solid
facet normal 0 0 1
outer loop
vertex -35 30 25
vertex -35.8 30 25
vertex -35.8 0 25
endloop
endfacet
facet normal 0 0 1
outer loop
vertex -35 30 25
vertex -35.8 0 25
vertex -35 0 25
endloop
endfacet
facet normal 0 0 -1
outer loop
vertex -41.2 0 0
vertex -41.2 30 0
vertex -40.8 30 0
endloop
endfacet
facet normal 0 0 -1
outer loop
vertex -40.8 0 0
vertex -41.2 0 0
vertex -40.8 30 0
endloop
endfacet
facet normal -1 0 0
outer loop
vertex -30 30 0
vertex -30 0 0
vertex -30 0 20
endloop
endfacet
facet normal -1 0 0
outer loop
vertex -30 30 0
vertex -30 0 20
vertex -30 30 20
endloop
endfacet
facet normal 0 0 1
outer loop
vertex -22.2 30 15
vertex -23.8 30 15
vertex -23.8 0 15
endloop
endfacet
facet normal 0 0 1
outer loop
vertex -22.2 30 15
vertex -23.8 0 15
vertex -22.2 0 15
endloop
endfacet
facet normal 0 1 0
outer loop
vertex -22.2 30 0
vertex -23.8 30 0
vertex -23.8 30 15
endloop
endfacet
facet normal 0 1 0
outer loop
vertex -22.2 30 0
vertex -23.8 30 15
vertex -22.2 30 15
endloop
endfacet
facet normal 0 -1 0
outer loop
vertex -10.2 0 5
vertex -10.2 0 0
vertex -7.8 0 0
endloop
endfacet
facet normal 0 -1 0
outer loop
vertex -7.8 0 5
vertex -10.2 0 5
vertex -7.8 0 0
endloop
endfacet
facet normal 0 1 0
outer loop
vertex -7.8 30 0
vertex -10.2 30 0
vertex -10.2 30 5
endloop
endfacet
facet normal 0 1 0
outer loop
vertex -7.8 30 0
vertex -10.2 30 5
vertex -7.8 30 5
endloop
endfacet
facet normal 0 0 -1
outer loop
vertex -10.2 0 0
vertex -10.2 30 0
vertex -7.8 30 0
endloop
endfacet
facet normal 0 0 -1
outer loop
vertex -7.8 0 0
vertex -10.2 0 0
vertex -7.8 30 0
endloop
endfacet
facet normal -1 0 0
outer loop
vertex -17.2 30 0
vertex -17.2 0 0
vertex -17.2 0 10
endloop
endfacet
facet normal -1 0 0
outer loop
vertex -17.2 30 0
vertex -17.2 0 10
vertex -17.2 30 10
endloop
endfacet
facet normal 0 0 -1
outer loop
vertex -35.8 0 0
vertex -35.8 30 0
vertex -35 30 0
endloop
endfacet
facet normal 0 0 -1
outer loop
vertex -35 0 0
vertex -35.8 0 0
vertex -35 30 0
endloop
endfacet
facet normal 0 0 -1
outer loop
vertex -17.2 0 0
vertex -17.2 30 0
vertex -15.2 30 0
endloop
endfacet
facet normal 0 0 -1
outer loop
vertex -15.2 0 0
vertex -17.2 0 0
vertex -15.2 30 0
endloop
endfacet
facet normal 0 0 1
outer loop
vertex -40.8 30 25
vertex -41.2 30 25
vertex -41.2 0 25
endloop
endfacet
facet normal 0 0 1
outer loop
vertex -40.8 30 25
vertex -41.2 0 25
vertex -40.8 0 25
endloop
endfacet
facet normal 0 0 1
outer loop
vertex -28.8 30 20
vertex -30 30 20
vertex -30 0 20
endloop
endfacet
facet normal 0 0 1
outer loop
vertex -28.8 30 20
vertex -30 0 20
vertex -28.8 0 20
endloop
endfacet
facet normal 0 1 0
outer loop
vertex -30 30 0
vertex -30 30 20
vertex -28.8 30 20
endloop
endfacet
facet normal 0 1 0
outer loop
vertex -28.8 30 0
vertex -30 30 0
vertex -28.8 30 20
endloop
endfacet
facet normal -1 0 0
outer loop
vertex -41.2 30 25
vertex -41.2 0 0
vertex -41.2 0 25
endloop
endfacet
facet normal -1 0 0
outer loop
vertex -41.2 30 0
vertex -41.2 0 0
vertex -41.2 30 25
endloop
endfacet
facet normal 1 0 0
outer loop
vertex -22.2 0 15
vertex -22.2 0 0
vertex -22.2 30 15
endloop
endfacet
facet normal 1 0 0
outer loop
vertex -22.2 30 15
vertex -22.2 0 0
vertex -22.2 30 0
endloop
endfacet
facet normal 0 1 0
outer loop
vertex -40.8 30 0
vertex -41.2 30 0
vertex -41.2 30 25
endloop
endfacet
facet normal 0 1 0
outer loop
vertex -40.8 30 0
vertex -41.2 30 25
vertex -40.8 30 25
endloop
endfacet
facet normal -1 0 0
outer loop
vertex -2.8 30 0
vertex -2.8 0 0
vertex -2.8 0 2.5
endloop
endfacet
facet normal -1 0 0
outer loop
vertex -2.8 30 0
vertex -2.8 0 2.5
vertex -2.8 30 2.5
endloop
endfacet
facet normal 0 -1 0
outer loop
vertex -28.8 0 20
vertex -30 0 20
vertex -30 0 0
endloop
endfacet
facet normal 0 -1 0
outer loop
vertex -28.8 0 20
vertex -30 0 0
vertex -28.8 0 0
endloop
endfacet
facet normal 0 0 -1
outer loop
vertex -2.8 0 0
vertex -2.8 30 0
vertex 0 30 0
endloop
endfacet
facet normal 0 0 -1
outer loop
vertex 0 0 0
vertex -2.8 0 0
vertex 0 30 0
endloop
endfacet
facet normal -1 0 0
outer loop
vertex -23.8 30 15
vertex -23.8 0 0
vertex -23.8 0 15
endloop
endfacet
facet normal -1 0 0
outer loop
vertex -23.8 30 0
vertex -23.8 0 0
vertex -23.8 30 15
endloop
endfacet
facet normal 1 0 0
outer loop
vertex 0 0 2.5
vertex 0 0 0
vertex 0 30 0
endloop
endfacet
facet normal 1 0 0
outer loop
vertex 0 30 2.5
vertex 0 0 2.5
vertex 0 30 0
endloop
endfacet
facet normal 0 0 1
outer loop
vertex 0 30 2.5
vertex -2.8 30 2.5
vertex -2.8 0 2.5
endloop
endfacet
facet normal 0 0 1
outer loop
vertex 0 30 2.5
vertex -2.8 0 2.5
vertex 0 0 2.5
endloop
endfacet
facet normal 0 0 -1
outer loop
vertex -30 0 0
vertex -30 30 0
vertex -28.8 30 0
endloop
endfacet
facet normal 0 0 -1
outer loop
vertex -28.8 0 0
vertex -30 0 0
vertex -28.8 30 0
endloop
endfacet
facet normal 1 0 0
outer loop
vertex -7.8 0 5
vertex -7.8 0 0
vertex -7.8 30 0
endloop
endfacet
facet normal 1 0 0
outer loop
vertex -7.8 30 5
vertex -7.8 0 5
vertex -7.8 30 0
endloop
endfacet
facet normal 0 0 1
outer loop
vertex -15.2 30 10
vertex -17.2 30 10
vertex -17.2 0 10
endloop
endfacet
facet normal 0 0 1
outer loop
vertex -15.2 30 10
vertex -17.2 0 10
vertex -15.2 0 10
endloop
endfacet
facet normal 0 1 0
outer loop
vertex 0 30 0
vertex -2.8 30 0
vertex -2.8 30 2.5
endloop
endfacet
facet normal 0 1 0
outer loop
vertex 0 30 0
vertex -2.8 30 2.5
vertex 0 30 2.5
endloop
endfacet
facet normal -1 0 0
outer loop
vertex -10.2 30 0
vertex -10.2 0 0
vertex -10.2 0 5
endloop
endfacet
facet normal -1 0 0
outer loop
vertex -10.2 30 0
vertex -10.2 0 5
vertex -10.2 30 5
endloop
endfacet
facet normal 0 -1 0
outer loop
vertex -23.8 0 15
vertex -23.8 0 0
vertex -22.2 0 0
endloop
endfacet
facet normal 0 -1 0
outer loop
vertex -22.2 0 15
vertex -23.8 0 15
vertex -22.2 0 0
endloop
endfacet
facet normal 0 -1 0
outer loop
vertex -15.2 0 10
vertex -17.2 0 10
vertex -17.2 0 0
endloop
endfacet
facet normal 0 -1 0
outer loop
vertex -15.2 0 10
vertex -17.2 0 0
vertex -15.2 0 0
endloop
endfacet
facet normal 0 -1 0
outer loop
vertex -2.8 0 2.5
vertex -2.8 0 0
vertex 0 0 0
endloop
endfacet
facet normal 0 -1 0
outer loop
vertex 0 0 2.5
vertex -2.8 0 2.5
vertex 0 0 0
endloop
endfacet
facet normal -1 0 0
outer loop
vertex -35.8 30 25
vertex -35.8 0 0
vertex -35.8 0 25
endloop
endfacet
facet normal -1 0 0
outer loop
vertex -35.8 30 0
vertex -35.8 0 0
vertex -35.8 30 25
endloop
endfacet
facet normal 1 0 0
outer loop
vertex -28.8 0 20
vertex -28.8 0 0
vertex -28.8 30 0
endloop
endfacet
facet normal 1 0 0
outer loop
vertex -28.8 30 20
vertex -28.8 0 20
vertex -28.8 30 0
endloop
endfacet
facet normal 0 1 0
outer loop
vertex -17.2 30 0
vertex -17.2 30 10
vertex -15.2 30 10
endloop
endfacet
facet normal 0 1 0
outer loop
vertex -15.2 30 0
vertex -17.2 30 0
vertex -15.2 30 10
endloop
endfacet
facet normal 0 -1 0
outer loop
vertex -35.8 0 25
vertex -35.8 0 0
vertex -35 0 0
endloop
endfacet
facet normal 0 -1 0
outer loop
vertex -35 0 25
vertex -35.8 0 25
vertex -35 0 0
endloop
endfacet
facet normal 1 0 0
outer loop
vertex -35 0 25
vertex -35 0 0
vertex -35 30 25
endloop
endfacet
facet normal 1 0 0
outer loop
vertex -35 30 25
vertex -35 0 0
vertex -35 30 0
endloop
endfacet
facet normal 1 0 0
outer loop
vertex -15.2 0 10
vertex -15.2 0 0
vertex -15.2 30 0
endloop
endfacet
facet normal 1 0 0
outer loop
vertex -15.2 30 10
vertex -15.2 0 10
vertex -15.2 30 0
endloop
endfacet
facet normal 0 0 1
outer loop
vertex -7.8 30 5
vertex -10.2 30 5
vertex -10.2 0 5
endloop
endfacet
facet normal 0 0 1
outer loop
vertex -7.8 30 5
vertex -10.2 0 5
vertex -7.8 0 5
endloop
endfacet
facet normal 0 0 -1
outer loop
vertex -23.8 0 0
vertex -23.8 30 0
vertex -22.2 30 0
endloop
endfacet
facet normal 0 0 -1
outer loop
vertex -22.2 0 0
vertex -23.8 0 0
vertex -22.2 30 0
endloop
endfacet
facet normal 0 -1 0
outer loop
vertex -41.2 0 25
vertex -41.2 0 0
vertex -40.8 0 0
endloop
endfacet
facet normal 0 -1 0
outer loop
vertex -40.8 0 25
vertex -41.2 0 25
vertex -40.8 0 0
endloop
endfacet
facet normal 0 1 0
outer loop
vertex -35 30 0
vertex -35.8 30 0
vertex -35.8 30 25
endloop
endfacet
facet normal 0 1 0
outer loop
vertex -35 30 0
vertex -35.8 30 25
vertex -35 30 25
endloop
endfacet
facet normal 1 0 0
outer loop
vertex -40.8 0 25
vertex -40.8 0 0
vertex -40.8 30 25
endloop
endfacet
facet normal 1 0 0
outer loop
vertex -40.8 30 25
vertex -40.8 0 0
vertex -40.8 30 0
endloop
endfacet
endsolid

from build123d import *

# Parameters (mm, degrees)
F0_W     = 0.4
F0_H     = 30
F1_DEPTH = 25
F0_W_2   = 0.8
F2_DEPTH = 25
F0_W_3   = 1.2
F3_DEPTH = 20
F0_W_4   = 1.6
F4_DEPTH = 15
F0_W_5   = 2
F5_DEPTH = 10
F0_W_6   = 2.4
F6_DEPTH = 5
F0_W_7   = 2.8
F7_DEPTH = 2.5


with BuildPart() as f1:
    # F0 (on Top) → F1 (new body)
    with BuildSketch(Plane.XY):
        with Locations((-41, 15)):
            Rectangle(F0_W, F0_H)
    extrude(amount=F1_DEPTH)


with BuildPart() as f2:
    # F0 (on Top) → F2 (new body)
    with BuildSketch(Plane.XY):
        with Locations((-35.4, 15)):
            Rectangle(F0_W_2, F0_H)
    extrude(amount=F2_DEPTH)


with BuildPart() as f3:
    # F0 (on Top) → F3 (new body)
    with BuildSketch(Plane.XY):
        with Locations((-29.4, 15)):
            Rectangle(F0_W_3, F0_H)
    extrude(amount=F3_DEPTH)


with BuildPart() as f4:
    # F0 (on Top) → F4 (new body)
    with BuildSketch(Plane.XY):
        with Locations((-23, 15)):
            Rectangle(F0_W_4, F0_H)
    extrude(amount=F4_DEPTH)


with BuildPart() as f5:
    # F0 (on Top) → F5 (new body)
    with BuildSketch(Plane.XY):
        with Locations((-16.2, 15)):
            Rectangle(F0_W_5, F0_H)
    extrude(amount=F5_DEPTH)


with BuildPart() as f6:
    # F0 (on Top) → F6 (new body)
    with BuildSketch(Plane.XY):
        with Locations((-9, 15)):
            Rectangle(F0_W_6, F0_H)
    extrude(amount=F6_DEPTH)


with BuildPart() as f7:
    # F0 (on Top) → F7 (new body)
    with BuildSketch(Plane.XY):
        with Locations((-1.4, 15)):
            Rectangle(F0_W_7, F0_H)
    extrude(amount=F7_DEPTH)


solid = Compound([f1.part, f2.part, f3.part, f4.part, f5.part, f6.part, f7.part])
